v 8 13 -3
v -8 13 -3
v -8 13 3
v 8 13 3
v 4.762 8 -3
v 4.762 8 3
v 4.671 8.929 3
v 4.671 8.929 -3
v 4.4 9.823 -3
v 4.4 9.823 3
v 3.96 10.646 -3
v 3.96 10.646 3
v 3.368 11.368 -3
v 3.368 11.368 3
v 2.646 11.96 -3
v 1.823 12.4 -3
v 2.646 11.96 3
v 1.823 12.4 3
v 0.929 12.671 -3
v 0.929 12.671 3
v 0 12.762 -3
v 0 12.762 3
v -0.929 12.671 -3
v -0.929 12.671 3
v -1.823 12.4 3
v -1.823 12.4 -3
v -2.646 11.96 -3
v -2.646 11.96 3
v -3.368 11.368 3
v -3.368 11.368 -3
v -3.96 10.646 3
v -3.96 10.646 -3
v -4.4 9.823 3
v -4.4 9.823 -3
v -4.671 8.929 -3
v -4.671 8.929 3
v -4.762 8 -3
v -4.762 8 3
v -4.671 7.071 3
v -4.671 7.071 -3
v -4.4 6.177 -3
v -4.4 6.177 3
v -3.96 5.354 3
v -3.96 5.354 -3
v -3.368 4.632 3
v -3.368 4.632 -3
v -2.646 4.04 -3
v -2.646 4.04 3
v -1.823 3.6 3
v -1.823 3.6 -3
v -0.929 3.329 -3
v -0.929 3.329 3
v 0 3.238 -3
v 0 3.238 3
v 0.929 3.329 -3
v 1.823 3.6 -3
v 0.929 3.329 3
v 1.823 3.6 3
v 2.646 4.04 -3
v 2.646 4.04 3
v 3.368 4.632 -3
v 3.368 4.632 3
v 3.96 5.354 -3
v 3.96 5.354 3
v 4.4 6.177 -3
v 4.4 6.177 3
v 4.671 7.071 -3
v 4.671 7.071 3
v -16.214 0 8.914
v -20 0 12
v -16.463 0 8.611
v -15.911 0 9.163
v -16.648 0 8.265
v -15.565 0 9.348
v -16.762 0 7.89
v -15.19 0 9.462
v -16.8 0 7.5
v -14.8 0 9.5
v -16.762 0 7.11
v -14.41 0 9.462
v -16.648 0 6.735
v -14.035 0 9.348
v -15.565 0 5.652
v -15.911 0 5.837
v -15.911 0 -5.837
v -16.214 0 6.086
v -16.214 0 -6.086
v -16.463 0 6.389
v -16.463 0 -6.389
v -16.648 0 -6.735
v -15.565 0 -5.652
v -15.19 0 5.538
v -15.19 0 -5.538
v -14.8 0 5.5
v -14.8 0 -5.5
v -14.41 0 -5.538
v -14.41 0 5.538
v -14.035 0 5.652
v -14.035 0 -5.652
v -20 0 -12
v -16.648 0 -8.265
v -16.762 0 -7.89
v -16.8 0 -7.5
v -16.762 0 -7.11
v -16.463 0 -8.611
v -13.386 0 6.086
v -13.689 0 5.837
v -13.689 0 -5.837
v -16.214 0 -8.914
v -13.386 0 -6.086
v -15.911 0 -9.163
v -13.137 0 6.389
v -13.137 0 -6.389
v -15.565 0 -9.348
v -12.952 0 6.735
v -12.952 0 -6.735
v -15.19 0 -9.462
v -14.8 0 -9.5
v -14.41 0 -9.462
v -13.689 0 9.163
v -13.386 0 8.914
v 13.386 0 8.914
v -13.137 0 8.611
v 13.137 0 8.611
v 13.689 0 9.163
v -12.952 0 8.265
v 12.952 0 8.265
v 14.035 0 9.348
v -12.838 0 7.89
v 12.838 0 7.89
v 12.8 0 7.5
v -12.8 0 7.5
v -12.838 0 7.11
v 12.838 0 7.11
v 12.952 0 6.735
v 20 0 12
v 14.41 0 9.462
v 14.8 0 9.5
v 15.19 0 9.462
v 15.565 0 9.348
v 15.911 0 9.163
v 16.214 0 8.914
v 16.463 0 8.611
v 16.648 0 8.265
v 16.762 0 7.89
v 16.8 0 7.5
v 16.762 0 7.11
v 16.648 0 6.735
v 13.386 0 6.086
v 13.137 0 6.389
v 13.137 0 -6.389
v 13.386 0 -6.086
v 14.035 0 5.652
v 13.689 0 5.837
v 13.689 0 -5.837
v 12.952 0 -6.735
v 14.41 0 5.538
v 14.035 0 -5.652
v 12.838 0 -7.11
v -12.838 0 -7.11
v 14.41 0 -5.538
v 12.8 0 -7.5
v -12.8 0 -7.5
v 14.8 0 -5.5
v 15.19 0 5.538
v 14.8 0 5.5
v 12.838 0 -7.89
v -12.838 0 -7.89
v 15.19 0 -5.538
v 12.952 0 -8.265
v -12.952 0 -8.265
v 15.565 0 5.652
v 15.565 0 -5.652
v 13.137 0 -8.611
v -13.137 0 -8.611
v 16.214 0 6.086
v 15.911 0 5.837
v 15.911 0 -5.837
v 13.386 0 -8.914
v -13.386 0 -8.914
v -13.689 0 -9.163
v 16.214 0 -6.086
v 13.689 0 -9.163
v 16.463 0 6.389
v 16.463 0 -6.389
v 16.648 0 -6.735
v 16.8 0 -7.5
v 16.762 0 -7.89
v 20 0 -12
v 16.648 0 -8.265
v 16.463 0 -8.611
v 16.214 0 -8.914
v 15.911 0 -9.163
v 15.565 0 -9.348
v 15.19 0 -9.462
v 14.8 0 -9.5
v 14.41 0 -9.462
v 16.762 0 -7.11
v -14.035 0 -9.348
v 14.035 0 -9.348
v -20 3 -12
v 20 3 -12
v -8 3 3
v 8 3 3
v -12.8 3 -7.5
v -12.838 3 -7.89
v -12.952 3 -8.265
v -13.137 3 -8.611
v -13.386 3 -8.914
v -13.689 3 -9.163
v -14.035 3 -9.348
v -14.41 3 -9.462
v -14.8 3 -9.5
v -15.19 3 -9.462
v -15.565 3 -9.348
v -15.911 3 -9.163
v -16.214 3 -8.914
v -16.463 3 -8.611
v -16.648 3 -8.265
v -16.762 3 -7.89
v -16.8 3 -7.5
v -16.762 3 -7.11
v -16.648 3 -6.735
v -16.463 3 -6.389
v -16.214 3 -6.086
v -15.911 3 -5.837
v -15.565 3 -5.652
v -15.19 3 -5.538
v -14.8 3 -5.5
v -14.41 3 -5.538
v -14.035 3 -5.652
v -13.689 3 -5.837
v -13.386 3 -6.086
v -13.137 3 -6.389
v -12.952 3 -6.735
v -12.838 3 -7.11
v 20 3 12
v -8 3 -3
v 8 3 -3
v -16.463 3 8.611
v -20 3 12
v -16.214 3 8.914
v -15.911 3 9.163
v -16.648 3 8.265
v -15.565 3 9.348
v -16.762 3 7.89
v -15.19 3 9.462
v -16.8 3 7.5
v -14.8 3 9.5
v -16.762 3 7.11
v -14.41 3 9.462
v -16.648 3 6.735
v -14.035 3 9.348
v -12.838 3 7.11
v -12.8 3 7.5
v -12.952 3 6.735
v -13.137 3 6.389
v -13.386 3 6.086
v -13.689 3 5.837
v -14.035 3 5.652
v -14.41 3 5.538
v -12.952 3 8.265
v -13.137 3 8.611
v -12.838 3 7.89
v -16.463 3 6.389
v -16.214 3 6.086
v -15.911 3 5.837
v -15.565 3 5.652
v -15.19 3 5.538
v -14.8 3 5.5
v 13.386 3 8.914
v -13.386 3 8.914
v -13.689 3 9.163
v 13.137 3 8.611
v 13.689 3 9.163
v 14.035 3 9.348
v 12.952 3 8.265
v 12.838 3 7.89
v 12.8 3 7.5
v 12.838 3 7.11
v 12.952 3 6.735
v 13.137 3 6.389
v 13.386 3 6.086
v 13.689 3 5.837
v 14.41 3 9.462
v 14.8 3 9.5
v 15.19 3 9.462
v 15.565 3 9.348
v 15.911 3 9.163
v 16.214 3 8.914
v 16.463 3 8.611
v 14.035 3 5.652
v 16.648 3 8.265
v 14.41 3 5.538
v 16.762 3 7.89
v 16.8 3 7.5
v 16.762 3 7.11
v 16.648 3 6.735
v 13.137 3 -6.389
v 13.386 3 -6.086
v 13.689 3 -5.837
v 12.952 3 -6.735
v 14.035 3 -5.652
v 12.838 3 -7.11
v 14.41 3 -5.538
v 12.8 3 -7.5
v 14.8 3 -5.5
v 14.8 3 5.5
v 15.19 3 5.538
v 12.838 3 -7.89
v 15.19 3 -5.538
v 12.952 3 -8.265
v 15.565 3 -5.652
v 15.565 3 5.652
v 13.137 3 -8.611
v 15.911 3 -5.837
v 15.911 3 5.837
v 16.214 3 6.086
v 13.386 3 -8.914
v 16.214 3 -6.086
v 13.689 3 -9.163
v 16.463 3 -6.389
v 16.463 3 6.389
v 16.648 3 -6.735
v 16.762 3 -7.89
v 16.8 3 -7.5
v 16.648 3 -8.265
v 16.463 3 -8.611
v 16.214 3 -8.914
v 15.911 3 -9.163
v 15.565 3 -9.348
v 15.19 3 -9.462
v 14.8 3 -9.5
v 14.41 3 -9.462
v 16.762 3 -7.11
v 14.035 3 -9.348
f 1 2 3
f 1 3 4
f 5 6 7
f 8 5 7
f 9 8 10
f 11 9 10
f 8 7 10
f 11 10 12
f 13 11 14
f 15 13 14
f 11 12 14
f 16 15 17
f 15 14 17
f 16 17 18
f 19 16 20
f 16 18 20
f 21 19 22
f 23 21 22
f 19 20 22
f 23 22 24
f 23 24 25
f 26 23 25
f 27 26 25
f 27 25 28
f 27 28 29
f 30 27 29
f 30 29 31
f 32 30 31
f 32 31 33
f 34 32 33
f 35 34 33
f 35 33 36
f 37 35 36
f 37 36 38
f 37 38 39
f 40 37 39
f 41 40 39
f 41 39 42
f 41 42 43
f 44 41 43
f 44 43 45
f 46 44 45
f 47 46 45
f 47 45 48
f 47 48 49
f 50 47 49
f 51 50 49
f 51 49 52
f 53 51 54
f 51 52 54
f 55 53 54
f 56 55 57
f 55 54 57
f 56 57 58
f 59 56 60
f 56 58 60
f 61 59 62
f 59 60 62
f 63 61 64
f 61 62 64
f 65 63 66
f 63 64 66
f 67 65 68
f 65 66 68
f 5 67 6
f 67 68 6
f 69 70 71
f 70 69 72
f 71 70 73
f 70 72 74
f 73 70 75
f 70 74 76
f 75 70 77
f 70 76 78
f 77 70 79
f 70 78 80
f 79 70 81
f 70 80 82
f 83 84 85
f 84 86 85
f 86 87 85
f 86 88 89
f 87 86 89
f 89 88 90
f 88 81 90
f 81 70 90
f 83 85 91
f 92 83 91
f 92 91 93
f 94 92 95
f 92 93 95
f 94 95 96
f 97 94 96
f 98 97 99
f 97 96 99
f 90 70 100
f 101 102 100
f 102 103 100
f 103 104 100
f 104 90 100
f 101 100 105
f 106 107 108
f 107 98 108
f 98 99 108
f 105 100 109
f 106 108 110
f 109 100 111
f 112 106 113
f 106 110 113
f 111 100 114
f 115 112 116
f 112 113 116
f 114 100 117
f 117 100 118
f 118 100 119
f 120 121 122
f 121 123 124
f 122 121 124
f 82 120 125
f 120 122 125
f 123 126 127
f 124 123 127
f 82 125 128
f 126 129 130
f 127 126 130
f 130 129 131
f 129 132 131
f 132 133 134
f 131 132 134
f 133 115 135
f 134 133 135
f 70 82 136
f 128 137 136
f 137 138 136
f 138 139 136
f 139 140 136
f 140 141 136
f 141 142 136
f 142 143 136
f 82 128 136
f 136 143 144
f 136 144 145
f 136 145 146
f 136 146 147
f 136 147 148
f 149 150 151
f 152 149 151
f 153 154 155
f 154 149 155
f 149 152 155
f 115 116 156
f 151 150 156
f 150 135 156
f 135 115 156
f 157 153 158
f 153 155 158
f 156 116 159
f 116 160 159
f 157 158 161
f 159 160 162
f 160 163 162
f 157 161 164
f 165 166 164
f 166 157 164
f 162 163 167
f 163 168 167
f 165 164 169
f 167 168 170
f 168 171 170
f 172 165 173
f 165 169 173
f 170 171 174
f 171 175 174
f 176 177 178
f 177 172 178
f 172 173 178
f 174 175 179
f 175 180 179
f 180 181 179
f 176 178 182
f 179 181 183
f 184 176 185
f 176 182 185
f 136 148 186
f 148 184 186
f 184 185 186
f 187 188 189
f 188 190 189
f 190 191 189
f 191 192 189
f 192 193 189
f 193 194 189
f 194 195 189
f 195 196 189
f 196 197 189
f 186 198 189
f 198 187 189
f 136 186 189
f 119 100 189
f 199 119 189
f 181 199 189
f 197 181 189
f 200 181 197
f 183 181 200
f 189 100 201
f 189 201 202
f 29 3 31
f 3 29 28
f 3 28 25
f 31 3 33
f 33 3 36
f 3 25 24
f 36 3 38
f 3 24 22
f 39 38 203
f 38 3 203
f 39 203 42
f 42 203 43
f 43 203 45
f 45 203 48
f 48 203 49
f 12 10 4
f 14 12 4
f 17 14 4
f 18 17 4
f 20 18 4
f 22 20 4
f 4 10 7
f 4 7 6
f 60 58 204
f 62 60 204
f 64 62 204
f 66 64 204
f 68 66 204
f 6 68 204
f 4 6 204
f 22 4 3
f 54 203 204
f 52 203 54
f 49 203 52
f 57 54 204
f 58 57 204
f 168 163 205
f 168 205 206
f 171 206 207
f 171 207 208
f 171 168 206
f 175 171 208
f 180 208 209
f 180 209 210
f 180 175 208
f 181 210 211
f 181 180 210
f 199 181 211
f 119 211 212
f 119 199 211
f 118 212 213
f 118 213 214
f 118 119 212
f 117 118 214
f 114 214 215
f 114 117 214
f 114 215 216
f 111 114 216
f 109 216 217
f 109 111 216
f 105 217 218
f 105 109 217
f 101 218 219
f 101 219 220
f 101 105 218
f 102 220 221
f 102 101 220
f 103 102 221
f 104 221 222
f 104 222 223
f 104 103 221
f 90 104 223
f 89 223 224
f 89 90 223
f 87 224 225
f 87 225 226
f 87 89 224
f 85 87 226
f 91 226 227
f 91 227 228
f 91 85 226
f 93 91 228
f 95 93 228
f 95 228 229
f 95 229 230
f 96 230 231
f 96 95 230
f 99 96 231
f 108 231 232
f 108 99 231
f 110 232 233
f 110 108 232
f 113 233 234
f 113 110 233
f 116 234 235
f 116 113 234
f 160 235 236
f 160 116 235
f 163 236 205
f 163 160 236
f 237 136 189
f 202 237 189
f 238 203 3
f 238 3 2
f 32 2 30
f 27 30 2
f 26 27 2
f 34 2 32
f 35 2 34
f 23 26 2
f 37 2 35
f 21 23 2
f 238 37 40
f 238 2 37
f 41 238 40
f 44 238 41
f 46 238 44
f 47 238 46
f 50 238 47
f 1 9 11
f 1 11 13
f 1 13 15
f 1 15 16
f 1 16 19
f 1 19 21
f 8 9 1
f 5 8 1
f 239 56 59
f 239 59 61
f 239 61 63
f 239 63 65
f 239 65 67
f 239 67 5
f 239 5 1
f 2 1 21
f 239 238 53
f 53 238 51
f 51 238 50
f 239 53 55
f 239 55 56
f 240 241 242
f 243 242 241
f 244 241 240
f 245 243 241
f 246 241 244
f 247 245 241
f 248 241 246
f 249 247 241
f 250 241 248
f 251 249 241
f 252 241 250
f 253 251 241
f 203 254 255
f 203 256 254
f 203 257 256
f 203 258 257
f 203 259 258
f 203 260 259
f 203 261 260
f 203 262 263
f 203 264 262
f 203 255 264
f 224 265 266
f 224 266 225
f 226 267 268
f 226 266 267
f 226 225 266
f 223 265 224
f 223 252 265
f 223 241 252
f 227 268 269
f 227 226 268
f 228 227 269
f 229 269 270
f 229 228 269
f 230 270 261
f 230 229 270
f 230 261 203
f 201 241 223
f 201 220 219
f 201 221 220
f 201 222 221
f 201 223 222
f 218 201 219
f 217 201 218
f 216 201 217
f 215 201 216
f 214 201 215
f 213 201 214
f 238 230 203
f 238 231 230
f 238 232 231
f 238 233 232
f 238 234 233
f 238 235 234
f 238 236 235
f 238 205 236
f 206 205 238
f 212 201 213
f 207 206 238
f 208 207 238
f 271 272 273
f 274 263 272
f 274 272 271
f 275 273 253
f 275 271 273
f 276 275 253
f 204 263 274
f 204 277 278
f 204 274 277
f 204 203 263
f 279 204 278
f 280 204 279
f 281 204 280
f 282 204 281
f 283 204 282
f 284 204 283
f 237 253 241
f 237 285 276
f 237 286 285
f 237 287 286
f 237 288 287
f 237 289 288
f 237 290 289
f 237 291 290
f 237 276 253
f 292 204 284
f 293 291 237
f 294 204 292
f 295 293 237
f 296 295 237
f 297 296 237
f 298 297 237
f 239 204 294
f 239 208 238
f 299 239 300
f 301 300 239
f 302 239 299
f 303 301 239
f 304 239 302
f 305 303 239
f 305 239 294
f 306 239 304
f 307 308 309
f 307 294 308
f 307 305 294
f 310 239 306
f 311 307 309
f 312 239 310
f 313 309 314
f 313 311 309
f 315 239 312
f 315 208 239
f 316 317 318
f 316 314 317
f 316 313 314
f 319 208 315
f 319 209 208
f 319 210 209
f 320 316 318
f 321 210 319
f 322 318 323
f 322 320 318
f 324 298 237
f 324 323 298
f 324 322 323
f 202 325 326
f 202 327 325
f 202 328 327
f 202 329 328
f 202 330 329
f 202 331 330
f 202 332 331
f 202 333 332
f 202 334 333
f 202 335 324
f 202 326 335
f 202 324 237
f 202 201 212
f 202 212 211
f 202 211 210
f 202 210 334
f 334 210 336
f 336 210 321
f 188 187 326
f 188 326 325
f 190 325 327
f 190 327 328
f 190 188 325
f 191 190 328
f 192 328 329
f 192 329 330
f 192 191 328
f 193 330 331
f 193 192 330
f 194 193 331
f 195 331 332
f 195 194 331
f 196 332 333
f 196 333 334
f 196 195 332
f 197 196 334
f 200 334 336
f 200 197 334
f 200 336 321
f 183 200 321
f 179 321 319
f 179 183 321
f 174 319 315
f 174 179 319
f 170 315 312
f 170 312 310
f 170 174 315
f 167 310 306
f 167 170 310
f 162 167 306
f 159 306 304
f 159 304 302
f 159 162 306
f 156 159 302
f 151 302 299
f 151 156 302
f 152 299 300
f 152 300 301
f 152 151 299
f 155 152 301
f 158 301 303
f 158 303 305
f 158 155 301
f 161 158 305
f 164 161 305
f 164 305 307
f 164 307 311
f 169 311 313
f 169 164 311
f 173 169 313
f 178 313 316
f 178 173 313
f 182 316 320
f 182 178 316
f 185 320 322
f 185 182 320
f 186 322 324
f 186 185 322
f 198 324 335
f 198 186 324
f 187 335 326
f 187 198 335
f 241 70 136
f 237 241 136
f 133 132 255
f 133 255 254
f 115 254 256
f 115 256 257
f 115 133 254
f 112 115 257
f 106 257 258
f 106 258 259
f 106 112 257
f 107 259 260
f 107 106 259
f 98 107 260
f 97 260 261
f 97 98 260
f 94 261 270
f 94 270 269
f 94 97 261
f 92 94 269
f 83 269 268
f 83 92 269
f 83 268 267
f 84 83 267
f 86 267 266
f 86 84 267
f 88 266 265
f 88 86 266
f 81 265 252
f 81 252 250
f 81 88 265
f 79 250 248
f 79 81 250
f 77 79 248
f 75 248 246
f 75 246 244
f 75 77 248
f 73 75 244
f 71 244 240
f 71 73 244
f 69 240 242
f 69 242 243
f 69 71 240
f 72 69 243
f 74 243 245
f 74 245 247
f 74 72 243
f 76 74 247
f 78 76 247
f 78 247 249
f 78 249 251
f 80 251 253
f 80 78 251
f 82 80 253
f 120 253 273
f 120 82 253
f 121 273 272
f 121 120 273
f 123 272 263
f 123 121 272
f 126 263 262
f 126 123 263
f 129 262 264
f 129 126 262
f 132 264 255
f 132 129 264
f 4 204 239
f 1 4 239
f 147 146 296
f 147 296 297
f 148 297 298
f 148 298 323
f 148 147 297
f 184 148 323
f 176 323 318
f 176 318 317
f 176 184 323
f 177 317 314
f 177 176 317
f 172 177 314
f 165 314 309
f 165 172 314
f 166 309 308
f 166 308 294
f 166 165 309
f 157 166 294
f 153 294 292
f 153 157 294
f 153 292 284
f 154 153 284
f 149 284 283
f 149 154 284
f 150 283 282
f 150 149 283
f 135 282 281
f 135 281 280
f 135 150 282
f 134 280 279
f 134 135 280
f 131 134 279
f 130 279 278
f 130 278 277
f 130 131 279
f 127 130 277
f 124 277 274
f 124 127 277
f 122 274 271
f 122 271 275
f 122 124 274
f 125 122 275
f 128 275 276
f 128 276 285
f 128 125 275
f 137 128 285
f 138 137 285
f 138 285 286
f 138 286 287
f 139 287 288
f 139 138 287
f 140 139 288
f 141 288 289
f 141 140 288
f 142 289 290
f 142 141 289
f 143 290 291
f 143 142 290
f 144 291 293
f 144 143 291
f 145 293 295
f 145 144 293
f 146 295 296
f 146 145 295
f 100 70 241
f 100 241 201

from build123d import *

# Parameters (mm, degrees)
SKETCH_1_W          = 40
SKETCH_1_H          = 24
SKETCH_1_R          = 2
EXTRUDE_1_DEPTH     = 3
SKETCH_2_W          = 16
SKETCH_2_H          = 6
EXTRUDE_2_DEPTH     = 10
SKETCH_3_R          = 4.7625
CUT_EXTRUDE_1_DEPTH = 10


with BuildPart() as part:
    # 草图1 → 凸台-拉伸1 (new body)
    with BuildSketch(Plane(origin=(0, 0, 0), x_dir=(1, 0, 0), z_dir=(0, 1, 0))):
        Rectangle(SKETCH_1_W, SKETCH_1_H)
        with Locations((-14.8, -7.5)):
            Circle(SKETCH_1_R, mode=Mode.SUBTRACT)
        with Locations((14.8, -7.5)):
            Circle(SKETCH_1_R, mode=Mode.SUBTRACT)
        with Locations((-14.8, 7.5)):
            Circle(SKETCH_1_R, mode=Mode.SUBTRACT)
        with Locations((14.8, 7.5)):
            Circle(SKETCH_1_R, mode=Mode.SUBTRACT)
    extrude(amount=EXTRUDE_1_DEPTH)

    # 草图2 → 凸台-拉伸2 (add)
    with BuildSketch(Plane(origin=(0, 3, 0), x_dir=(1, 0, 0), z_dir=(0, 1, 0))):
        Rectangle(SKETCH_2_W, SKETCH_2_H)
    extrude(amount=EXTRUDE_2_DEPTH)

    # 草图3 → 切除-拉伸1 (cut)
    with BuildSketch(Plane.XY.offset(3)):
        with Locations((0, 8)):
            Circle(SKETCH_3_R)
    extrude(amount=-CUT_EXTRUDE_1_DEPTH, mode=Mode.SUBTRACT)


solid = part.part
